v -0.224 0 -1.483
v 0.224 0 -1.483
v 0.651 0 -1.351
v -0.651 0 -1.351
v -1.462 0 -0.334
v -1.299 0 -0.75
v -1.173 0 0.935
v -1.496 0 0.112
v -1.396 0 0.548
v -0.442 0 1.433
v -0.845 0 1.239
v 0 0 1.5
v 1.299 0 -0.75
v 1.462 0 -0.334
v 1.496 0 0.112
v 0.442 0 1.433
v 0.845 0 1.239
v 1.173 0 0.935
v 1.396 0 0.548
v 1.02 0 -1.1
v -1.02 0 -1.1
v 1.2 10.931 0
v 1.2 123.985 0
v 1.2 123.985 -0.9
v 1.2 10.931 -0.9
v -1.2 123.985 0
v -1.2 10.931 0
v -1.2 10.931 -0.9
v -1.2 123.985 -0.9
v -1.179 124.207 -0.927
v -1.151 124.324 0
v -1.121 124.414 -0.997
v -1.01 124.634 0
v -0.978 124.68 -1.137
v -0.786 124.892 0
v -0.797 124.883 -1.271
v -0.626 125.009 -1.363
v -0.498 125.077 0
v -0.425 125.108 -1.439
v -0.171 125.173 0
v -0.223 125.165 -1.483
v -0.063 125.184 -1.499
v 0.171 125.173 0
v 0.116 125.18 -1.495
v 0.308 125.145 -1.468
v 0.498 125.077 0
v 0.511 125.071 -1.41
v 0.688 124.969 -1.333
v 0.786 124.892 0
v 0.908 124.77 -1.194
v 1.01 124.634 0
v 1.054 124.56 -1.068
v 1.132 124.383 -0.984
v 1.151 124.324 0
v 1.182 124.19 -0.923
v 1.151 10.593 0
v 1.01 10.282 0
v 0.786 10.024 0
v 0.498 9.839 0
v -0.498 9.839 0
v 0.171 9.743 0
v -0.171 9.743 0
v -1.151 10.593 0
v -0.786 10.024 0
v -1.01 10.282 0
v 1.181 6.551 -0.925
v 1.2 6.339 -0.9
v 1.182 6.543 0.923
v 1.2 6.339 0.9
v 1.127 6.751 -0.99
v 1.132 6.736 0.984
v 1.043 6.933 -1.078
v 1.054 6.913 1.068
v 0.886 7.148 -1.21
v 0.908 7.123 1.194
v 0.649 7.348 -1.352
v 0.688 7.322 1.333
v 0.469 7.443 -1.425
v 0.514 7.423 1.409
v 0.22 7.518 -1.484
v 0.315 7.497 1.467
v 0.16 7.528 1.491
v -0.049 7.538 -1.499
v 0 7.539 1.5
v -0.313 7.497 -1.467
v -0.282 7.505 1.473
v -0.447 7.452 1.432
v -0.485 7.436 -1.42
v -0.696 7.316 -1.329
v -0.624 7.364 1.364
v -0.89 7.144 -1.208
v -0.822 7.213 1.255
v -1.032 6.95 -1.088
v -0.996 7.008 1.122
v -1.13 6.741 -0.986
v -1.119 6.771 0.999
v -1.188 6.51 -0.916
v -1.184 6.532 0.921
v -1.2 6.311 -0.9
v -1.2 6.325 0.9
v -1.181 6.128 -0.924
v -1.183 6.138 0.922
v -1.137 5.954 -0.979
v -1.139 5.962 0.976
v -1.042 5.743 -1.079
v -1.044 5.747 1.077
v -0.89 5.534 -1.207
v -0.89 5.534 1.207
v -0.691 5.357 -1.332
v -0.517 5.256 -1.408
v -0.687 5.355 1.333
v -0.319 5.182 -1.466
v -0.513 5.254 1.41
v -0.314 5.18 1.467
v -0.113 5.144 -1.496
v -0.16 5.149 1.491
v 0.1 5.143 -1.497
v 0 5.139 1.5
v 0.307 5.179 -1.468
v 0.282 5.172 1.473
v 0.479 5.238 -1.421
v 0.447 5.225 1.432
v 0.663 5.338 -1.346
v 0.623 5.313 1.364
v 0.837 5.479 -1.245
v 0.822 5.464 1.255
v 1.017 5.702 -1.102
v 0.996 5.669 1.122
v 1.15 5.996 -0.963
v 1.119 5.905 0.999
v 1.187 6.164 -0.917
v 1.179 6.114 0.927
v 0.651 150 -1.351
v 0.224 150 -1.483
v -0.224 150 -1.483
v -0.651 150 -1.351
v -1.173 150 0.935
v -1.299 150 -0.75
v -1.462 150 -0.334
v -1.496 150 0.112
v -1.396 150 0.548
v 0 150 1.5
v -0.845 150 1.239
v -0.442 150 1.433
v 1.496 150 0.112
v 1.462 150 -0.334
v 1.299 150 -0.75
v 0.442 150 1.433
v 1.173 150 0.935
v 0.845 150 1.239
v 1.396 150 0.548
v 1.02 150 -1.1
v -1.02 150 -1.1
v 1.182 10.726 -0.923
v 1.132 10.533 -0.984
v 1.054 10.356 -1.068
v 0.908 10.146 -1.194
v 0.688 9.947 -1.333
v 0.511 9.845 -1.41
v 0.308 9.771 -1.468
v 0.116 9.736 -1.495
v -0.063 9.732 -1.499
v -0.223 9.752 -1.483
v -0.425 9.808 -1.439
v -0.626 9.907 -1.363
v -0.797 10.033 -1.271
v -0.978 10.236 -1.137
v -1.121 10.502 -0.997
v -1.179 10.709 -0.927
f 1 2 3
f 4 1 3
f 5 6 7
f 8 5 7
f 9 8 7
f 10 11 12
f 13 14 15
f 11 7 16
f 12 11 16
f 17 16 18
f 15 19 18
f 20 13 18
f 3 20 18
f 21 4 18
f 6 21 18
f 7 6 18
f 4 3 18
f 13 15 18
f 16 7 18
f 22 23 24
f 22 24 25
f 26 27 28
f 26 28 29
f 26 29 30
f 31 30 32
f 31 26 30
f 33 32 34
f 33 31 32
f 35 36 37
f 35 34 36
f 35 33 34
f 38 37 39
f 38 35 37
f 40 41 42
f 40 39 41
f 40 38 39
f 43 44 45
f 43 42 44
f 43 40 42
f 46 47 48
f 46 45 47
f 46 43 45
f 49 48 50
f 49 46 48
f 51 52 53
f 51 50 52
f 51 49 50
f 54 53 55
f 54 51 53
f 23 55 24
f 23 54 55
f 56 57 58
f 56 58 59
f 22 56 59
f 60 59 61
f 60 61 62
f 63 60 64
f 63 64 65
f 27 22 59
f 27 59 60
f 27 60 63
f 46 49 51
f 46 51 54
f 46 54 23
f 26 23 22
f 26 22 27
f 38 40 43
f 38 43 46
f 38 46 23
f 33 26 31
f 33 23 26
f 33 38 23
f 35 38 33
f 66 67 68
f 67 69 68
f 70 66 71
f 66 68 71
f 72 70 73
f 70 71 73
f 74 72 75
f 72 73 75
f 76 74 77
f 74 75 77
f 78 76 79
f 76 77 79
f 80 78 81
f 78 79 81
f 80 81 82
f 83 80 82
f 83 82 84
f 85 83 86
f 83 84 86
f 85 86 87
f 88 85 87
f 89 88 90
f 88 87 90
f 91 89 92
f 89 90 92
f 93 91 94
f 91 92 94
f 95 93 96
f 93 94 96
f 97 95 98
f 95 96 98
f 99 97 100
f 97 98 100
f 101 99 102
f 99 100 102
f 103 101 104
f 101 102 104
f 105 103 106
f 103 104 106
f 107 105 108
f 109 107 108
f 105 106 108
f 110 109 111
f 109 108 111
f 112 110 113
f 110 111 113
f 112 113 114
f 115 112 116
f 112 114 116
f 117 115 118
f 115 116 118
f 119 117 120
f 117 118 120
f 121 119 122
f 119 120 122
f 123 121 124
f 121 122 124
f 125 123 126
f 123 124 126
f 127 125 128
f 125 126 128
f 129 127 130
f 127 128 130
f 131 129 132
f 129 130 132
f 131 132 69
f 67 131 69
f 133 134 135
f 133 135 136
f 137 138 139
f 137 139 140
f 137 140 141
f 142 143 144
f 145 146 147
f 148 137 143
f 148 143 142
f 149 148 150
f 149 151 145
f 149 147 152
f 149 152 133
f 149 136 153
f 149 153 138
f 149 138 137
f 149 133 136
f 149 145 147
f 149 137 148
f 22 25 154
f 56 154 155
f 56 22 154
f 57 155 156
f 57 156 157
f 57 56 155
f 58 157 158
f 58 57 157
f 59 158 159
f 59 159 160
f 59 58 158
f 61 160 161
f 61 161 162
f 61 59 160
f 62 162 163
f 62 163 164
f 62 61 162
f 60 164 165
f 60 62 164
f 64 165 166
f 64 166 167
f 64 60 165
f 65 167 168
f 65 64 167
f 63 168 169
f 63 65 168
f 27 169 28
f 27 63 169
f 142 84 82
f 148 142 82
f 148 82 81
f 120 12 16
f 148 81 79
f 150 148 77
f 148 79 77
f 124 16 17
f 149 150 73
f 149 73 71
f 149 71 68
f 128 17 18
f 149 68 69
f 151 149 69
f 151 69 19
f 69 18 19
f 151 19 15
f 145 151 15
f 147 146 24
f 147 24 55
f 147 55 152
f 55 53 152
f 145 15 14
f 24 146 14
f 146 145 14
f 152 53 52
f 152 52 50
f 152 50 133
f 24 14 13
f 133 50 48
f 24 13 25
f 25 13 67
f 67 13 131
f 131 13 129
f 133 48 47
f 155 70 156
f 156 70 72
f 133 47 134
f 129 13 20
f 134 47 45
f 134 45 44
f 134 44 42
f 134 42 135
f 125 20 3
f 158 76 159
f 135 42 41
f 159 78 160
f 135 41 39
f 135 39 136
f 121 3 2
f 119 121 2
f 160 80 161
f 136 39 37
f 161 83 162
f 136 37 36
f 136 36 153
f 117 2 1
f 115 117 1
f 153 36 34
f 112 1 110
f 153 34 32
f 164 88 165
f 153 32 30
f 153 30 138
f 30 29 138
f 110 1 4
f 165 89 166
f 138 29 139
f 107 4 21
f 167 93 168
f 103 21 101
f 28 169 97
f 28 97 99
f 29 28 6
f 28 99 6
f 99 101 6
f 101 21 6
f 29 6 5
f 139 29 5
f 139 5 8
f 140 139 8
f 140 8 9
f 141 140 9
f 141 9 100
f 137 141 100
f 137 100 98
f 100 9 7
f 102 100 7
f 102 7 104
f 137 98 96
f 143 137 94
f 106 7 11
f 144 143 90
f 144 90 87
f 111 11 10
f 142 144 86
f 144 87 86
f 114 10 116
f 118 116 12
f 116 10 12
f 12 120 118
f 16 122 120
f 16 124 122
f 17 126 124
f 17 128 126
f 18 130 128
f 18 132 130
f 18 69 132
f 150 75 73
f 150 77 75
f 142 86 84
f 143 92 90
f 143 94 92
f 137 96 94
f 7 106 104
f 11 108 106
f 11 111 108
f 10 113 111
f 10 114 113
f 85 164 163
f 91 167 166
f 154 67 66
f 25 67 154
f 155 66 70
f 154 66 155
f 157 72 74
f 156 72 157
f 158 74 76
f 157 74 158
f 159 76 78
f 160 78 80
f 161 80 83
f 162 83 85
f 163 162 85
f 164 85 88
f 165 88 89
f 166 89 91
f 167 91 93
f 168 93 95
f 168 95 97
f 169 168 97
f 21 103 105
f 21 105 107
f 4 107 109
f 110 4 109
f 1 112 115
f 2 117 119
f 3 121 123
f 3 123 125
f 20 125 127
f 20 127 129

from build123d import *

# Parameters (mm, degrees)
SKETCH_1_R          = 1.5
EXTRUDE_1_DEPTH     = 150
SKETCH_3_R          = 1.2
CUT_EXTRUDE_2_DEPTH = 150
CUT_EXTRUDE_3_DEPTH = 10


with BuildPart() as part:
    # 草图1 → 凸台-拉伸1 (new body)
    with BuildSketch(Plane(origin=(0, 0, 0), x_dir=(1, 0, 0), z_dir=(0, 1, 0))):
        with Locations(Location((0, 0, 0), (0, 0, 270))):
            Circle(SKETCH_1_R)
    extrude(amount=EXTRUDE_1_DEPTH)

    # 草图3 → 切除-拉伸2 (cut, symmetric)
    with BuildSketch(Plane.XY):
        with Locations((0, 6.338597252)):
            Circle(SKETCH_3_R)
    extrude(amount=CUT_EXTRUDE_2_DEPTH, both=True, mode=Mode.SUBTRACT)

    # 草图5 → 切除-拉伸3 (cut)
    with BuildSketch(Plane.XY):
        with BuildLine():
            Line((1.2, 123.985472487), (1.2, 10.930622971))
            ThreePointArc((1.2, 10.930622971), (0, 9.730622971), (-1.2, 10.930622971))
            Line((-1.2, 10.930622971), (-1.2, 123.985472487))
            ThreePointArc((-1.2, 123.985472487), (0, 125.185472487), (1.2, 123.985472487))
        make_face()
    extrude(amount=-CUT_EXTRUDE_3_DEPTH, mode=Mode.SUBTRACT)


solid = part.part
